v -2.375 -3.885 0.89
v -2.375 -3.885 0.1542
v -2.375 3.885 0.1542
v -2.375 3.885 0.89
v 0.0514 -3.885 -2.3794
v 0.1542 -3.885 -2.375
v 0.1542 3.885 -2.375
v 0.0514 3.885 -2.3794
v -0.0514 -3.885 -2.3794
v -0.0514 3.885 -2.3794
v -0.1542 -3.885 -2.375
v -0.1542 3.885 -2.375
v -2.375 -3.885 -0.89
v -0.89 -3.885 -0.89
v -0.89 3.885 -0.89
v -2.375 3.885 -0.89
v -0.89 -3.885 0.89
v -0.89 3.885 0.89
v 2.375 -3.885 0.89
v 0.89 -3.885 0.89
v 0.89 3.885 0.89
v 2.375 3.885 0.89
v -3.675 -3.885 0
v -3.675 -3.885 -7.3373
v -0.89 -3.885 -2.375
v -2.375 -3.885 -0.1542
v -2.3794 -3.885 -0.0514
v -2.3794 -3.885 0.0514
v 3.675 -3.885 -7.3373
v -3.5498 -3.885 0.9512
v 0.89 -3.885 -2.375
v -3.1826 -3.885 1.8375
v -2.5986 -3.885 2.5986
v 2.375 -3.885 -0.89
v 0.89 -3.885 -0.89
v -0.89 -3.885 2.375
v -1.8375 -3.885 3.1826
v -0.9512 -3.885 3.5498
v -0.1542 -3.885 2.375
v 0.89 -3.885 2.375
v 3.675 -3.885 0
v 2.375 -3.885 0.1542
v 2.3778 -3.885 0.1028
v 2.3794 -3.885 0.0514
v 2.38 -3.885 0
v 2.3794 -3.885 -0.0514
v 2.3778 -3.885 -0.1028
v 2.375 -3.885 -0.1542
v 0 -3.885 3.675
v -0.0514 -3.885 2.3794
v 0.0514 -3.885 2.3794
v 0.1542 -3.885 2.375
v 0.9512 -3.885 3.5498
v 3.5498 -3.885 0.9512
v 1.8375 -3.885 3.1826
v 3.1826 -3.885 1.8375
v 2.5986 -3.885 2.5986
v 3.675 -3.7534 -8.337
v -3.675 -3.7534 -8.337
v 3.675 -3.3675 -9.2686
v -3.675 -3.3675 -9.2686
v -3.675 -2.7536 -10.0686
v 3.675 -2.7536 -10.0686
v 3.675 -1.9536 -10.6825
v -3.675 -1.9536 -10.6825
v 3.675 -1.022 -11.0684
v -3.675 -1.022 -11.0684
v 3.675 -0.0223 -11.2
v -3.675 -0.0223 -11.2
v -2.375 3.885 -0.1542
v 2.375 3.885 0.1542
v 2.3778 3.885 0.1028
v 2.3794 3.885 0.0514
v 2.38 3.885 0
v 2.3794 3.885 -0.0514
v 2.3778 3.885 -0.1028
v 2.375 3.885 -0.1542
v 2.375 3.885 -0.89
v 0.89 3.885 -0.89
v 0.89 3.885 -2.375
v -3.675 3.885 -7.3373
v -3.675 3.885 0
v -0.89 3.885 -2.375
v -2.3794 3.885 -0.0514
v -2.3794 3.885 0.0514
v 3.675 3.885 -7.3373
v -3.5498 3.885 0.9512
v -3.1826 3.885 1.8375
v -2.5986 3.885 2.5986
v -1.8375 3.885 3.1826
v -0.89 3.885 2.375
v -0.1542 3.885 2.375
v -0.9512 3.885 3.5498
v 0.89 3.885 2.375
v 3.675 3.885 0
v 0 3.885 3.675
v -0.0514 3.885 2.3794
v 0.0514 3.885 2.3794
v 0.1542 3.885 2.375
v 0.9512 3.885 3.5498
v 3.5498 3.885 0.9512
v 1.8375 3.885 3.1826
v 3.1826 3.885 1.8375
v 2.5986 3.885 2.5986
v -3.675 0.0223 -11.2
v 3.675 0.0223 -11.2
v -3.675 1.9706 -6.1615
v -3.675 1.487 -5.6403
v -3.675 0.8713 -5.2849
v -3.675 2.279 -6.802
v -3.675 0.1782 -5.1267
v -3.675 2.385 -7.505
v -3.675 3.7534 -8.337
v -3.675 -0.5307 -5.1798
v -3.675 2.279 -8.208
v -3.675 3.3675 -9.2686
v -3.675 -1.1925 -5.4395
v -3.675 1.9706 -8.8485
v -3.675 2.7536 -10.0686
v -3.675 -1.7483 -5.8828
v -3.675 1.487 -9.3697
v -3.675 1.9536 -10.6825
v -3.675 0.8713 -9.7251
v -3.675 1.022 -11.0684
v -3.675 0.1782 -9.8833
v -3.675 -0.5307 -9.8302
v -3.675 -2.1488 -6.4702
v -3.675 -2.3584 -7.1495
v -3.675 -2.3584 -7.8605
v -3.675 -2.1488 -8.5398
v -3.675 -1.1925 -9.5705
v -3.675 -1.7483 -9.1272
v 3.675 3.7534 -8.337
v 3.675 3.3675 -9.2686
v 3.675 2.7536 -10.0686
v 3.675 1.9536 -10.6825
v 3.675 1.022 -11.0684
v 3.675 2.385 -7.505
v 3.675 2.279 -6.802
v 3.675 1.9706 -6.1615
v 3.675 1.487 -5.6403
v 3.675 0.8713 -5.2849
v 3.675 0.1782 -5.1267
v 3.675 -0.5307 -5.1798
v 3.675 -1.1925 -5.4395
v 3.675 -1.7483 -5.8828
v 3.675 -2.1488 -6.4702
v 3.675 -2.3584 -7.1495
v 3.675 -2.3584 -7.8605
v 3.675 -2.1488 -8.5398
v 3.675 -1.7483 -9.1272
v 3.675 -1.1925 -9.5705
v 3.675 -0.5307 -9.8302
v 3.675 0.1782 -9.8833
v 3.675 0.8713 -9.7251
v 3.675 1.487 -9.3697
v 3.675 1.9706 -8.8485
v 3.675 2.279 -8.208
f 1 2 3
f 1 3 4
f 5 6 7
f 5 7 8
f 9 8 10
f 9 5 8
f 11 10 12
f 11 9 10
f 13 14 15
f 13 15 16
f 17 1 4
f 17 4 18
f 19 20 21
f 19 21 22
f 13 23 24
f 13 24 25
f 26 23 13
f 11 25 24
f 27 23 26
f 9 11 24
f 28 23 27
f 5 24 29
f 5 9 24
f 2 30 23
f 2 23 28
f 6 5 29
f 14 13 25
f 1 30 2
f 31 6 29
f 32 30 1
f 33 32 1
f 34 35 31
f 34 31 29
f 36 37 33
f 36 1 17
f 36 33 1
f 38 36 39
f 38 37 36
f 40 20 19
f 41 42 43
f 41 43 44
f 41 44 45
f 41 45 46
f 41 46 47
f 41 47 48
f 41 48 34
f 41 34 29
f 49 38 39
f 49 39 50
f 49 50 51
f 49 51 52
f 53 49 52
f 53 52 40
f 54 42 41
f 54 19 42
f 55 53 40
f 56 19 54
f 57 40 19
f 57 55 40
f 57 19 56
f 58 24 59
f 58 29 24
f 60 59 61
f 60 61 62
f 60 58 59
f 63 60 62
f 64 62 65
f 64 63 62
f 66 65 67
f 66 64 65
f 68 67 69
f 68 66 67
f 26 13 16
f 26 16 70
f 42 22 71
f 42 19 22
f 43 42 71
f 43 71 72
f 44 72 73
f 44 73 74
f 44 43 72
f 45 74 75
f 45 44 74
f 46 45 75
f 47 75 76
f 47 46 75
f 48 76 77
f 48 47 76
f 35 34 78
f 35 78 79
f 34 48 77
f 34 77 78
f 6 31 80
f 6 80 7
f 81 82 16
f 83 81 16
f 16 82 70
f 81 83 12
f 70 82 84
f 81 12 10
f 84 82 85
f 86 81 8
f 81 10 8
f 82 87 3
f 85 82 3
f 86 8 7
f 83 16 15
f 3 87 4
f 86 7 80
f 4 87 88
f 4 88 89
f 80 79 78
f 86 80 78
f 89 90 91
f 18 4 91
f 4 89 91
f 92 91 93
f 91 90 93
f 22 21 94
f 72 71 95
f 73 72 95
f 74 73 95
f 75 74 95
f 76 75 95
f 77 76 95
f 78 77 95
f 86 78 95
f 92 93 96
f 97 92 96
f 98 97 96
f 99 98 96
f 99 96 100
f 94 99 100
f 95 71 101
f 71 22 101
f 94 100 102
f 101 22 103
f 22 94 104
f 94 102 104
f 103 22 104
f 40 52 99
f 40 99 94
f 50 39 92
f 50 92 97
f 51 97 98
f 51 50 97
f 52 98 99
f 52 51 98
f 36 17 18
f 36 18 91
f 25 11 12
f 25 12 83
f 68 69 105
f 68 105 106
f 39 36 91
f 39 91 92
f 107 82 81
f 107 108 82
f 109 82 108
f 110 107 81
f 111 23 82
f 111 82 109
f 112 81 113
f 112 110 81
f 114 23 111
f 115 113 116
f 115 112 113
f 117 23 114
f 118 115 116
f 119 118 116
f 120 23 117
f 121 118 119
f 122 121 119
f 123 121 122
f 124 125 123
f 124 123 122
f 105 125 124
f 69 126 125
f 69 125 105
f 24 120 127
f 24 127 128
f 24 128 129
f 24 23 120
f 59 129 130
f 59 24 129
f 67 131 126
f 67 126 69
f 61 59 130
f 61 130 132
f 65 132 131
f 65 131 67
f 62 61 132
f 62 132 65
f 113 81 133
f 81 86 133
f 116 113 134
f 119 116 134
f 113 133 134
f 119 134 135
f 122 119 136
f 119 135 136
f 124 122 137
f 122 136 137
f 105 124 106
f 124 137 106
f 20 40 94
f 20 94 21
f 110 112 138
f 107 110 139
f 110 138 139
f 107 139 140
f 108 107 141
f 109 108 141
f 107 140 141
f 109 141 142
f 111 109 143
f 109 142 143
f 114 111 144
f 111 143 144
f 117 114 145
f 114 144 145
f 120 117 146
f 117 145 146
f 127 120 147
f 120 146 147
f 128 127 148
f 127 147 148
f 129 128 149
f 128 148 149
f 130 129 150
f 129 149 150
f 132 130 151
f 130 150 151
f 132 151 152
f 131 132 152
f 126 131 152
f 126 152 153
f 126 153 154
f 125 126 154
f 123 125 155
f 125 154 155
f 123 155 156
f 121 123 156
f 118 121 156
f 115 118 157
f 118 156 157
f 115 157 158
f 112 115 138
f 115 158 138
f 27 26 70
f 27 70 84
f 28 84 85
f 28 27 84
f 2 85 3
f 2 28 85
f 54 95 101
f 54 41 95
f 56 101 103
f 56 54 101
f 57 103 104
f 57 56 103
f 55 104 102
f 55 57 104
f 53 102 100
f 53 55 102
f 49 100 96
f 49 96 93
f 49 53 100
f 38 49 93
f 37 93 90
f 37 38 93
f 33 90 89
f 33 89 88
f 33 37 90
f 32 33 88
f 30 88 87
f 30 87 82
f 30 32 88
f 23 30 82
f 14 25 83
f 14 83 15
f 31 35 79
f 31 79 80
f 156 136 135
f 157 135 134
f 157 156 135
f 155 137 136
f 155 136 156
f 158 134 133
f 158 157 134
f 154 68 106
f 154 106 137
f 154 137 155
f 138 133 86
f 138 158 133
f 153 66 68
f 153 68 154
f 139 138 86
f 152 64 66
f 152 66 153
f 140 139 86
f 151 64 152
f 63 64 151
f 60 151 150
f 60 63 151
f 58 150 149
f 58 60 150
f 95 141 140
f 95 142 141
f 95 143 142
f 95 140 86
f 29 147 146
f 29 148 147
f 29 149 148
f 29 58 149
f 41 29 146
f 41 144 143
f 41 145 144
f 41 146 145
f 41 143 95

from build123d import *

# Parameters (mm, degrees)
F1_DEPTH = 3.885
F2_R     = 2.385
F3_DEPTH = 12.5
F4_R     = 3.8627416998


with BuildPart() as f1:
    # F0 (on Front) → F1 (new body, symmetric)
    with BuildSketch(Plane.XZ):
        with BuildLine():
            ThreePointArc((-3.675, 0), (0, -3.675), (3.675, 0))
            ThreePointArc((3.675, 0), (0, 3.675), (-3.675, 0))
        make_face()
        with BuildLine():
            ThreePointArc((2.375, 0.1541914395), (2.3787496716, 0.0771362431), (2.38, 0))
            ThreePointArc((2.38, 0), (2.3787496716, -0.0771362431), (2.375, -0.1541914395))
            Line((2.375, -0.1541914395), (2.375, -0.89))
            Line((2.375, -0.89), (2.2073287023, -0.89))
            ThreePointArc((2.2073287023, -0.89), (1.6829141392, -1.6829141392), (0.89, -2.2073287023))
            Line((0.89, -2.2073287023), (0.89, -2.375))
            Line((0.89, -2.375), (0.1541914395, -2.375))
            ThreePointArc((0.1541914395, -2.375), (0, -2.38), (-0.1541914395, -2.375))
            Line((-0.1541914395, -2.375), (-0.89, -2.375))
            Line((-0.89, -2.375), (-0.89, -2.2073287023))
            ThreePointArc((-0.89, -2.2073287023), (-1.6829141392, -1.6829141392), (-2.2073287023, -0.89))
            Line((-2.2073287023, -0.89), (-2.375, -0.89))
            Line((-2.375, -0.89), (-2.375, -0.1541914395))
            ThreePointArc((-2.375, -0.1541914395), (-2.38, 0), (-2.375, 0.1541914395))
            Line((-2.375, 0.1541914395), (-2.375, 0.89))
            Line((-2.375, 0.89), (-2.2073287023, 0.89))
            ThreePointArc((-2.2073287023, 0.89), (-1.6829141392, 1.6829141392), (-0.89, 2.2073287023))
            Line((-0.89, 2.2073287023), (-0.89, 2.375))
            Line((-0.89, 2.375), (-0.1541914395, 2.375))
            ThreePointArc((-0.1541914395, 2.375), (0, 2.38), (0.1541914395, 2.375))
            Line((0.1541914395, 2.375), (0.89, 2.375))
            Line((0.89, 2.375), (0.89, 2.2073287023))
            ThreePointArc((0.89, 2.2073287023), (1.6829141392, 1.6829141392), (2.2073287023, 0.89))
            Line((2.2073287023, 0.89), (2.375, 0.89))
            Line((2.375, 0.89), (2.375, 0.1541914395))
        make_face(mode=Mode.SUBTRACT)
        with BuildLine():
            Line((3.675, -11.2), (3.675, 0))
            ThreePointArc((3.675, 0), (0, -3.675), (-3.675, 0))
            Line((-3.675, 0), (-3.675, -11.2))
            Line((-3.675, -11.2), (3.675, -11.2))
        make_face()
        with BuildLine():
            Line((-0.89, -2.2073287023), (-0.89, -0.89))
            Line((-0.89, -0.89), (-2.2073287023, -0.89))
            ThreePointArc((-2.2073287023, -0.89), (-1.6829141392, -1.6829141392), (-0.89, -2.2073287023))
        make_face()
        with BuildLine():
            Line((-2.2073287023, 0.89), (-0.89, 0.89))
            Line((-0.89, 0.89), (-0.89, 2.2073287023))
            ThreePointArc((-0.89, 2.2073287023), (-1.6829141392, 1.6829141392), (-2.2073287023, 0.89))
        make_face()
        with BuildLine():
            Line((0.89, 0.89), (2.2073287023, 0.89))
            ThreePointArc((2.2073287023, 0.89), (1.6829141392, 1.6829141392), (0.89, 2.2073287023))
            Line((0.89, 2.2073287023), (0.89, 0.89))
        make_face()
        with BuildLine():
            ThreePointArc((0.89, -2.2073287023), (1.6829141392, -1.6829141392), (2.2073287023, -0.89))
            Line((2.2073287023, -0.89), (0.89, -0.89))
            Line((0.89, -0.89), (0.89, -2.2073287023))
        make_face()
    extrude(amount=F1_DEPTH, both=True)

    # F2 (on face) → F3 (cut, symmetric)
    with BuildSketch(Plane.YZ.offset(3.675)):
        with Locations((0, -7.505)):
            Circle(F2_R)
    extrude(amount=F3_DEPTH, both=True, mode=Mode.SUBTRACT)

    # F4
    f4_edges = [f1.edges().sort_by_distance(p)[0] for p in [
        (0, 3.885, -11.2),
        (0, -3.885, -11.2),
    ]]
    fillet(f4_edges, radius=F4_R)


solid = f1.part
